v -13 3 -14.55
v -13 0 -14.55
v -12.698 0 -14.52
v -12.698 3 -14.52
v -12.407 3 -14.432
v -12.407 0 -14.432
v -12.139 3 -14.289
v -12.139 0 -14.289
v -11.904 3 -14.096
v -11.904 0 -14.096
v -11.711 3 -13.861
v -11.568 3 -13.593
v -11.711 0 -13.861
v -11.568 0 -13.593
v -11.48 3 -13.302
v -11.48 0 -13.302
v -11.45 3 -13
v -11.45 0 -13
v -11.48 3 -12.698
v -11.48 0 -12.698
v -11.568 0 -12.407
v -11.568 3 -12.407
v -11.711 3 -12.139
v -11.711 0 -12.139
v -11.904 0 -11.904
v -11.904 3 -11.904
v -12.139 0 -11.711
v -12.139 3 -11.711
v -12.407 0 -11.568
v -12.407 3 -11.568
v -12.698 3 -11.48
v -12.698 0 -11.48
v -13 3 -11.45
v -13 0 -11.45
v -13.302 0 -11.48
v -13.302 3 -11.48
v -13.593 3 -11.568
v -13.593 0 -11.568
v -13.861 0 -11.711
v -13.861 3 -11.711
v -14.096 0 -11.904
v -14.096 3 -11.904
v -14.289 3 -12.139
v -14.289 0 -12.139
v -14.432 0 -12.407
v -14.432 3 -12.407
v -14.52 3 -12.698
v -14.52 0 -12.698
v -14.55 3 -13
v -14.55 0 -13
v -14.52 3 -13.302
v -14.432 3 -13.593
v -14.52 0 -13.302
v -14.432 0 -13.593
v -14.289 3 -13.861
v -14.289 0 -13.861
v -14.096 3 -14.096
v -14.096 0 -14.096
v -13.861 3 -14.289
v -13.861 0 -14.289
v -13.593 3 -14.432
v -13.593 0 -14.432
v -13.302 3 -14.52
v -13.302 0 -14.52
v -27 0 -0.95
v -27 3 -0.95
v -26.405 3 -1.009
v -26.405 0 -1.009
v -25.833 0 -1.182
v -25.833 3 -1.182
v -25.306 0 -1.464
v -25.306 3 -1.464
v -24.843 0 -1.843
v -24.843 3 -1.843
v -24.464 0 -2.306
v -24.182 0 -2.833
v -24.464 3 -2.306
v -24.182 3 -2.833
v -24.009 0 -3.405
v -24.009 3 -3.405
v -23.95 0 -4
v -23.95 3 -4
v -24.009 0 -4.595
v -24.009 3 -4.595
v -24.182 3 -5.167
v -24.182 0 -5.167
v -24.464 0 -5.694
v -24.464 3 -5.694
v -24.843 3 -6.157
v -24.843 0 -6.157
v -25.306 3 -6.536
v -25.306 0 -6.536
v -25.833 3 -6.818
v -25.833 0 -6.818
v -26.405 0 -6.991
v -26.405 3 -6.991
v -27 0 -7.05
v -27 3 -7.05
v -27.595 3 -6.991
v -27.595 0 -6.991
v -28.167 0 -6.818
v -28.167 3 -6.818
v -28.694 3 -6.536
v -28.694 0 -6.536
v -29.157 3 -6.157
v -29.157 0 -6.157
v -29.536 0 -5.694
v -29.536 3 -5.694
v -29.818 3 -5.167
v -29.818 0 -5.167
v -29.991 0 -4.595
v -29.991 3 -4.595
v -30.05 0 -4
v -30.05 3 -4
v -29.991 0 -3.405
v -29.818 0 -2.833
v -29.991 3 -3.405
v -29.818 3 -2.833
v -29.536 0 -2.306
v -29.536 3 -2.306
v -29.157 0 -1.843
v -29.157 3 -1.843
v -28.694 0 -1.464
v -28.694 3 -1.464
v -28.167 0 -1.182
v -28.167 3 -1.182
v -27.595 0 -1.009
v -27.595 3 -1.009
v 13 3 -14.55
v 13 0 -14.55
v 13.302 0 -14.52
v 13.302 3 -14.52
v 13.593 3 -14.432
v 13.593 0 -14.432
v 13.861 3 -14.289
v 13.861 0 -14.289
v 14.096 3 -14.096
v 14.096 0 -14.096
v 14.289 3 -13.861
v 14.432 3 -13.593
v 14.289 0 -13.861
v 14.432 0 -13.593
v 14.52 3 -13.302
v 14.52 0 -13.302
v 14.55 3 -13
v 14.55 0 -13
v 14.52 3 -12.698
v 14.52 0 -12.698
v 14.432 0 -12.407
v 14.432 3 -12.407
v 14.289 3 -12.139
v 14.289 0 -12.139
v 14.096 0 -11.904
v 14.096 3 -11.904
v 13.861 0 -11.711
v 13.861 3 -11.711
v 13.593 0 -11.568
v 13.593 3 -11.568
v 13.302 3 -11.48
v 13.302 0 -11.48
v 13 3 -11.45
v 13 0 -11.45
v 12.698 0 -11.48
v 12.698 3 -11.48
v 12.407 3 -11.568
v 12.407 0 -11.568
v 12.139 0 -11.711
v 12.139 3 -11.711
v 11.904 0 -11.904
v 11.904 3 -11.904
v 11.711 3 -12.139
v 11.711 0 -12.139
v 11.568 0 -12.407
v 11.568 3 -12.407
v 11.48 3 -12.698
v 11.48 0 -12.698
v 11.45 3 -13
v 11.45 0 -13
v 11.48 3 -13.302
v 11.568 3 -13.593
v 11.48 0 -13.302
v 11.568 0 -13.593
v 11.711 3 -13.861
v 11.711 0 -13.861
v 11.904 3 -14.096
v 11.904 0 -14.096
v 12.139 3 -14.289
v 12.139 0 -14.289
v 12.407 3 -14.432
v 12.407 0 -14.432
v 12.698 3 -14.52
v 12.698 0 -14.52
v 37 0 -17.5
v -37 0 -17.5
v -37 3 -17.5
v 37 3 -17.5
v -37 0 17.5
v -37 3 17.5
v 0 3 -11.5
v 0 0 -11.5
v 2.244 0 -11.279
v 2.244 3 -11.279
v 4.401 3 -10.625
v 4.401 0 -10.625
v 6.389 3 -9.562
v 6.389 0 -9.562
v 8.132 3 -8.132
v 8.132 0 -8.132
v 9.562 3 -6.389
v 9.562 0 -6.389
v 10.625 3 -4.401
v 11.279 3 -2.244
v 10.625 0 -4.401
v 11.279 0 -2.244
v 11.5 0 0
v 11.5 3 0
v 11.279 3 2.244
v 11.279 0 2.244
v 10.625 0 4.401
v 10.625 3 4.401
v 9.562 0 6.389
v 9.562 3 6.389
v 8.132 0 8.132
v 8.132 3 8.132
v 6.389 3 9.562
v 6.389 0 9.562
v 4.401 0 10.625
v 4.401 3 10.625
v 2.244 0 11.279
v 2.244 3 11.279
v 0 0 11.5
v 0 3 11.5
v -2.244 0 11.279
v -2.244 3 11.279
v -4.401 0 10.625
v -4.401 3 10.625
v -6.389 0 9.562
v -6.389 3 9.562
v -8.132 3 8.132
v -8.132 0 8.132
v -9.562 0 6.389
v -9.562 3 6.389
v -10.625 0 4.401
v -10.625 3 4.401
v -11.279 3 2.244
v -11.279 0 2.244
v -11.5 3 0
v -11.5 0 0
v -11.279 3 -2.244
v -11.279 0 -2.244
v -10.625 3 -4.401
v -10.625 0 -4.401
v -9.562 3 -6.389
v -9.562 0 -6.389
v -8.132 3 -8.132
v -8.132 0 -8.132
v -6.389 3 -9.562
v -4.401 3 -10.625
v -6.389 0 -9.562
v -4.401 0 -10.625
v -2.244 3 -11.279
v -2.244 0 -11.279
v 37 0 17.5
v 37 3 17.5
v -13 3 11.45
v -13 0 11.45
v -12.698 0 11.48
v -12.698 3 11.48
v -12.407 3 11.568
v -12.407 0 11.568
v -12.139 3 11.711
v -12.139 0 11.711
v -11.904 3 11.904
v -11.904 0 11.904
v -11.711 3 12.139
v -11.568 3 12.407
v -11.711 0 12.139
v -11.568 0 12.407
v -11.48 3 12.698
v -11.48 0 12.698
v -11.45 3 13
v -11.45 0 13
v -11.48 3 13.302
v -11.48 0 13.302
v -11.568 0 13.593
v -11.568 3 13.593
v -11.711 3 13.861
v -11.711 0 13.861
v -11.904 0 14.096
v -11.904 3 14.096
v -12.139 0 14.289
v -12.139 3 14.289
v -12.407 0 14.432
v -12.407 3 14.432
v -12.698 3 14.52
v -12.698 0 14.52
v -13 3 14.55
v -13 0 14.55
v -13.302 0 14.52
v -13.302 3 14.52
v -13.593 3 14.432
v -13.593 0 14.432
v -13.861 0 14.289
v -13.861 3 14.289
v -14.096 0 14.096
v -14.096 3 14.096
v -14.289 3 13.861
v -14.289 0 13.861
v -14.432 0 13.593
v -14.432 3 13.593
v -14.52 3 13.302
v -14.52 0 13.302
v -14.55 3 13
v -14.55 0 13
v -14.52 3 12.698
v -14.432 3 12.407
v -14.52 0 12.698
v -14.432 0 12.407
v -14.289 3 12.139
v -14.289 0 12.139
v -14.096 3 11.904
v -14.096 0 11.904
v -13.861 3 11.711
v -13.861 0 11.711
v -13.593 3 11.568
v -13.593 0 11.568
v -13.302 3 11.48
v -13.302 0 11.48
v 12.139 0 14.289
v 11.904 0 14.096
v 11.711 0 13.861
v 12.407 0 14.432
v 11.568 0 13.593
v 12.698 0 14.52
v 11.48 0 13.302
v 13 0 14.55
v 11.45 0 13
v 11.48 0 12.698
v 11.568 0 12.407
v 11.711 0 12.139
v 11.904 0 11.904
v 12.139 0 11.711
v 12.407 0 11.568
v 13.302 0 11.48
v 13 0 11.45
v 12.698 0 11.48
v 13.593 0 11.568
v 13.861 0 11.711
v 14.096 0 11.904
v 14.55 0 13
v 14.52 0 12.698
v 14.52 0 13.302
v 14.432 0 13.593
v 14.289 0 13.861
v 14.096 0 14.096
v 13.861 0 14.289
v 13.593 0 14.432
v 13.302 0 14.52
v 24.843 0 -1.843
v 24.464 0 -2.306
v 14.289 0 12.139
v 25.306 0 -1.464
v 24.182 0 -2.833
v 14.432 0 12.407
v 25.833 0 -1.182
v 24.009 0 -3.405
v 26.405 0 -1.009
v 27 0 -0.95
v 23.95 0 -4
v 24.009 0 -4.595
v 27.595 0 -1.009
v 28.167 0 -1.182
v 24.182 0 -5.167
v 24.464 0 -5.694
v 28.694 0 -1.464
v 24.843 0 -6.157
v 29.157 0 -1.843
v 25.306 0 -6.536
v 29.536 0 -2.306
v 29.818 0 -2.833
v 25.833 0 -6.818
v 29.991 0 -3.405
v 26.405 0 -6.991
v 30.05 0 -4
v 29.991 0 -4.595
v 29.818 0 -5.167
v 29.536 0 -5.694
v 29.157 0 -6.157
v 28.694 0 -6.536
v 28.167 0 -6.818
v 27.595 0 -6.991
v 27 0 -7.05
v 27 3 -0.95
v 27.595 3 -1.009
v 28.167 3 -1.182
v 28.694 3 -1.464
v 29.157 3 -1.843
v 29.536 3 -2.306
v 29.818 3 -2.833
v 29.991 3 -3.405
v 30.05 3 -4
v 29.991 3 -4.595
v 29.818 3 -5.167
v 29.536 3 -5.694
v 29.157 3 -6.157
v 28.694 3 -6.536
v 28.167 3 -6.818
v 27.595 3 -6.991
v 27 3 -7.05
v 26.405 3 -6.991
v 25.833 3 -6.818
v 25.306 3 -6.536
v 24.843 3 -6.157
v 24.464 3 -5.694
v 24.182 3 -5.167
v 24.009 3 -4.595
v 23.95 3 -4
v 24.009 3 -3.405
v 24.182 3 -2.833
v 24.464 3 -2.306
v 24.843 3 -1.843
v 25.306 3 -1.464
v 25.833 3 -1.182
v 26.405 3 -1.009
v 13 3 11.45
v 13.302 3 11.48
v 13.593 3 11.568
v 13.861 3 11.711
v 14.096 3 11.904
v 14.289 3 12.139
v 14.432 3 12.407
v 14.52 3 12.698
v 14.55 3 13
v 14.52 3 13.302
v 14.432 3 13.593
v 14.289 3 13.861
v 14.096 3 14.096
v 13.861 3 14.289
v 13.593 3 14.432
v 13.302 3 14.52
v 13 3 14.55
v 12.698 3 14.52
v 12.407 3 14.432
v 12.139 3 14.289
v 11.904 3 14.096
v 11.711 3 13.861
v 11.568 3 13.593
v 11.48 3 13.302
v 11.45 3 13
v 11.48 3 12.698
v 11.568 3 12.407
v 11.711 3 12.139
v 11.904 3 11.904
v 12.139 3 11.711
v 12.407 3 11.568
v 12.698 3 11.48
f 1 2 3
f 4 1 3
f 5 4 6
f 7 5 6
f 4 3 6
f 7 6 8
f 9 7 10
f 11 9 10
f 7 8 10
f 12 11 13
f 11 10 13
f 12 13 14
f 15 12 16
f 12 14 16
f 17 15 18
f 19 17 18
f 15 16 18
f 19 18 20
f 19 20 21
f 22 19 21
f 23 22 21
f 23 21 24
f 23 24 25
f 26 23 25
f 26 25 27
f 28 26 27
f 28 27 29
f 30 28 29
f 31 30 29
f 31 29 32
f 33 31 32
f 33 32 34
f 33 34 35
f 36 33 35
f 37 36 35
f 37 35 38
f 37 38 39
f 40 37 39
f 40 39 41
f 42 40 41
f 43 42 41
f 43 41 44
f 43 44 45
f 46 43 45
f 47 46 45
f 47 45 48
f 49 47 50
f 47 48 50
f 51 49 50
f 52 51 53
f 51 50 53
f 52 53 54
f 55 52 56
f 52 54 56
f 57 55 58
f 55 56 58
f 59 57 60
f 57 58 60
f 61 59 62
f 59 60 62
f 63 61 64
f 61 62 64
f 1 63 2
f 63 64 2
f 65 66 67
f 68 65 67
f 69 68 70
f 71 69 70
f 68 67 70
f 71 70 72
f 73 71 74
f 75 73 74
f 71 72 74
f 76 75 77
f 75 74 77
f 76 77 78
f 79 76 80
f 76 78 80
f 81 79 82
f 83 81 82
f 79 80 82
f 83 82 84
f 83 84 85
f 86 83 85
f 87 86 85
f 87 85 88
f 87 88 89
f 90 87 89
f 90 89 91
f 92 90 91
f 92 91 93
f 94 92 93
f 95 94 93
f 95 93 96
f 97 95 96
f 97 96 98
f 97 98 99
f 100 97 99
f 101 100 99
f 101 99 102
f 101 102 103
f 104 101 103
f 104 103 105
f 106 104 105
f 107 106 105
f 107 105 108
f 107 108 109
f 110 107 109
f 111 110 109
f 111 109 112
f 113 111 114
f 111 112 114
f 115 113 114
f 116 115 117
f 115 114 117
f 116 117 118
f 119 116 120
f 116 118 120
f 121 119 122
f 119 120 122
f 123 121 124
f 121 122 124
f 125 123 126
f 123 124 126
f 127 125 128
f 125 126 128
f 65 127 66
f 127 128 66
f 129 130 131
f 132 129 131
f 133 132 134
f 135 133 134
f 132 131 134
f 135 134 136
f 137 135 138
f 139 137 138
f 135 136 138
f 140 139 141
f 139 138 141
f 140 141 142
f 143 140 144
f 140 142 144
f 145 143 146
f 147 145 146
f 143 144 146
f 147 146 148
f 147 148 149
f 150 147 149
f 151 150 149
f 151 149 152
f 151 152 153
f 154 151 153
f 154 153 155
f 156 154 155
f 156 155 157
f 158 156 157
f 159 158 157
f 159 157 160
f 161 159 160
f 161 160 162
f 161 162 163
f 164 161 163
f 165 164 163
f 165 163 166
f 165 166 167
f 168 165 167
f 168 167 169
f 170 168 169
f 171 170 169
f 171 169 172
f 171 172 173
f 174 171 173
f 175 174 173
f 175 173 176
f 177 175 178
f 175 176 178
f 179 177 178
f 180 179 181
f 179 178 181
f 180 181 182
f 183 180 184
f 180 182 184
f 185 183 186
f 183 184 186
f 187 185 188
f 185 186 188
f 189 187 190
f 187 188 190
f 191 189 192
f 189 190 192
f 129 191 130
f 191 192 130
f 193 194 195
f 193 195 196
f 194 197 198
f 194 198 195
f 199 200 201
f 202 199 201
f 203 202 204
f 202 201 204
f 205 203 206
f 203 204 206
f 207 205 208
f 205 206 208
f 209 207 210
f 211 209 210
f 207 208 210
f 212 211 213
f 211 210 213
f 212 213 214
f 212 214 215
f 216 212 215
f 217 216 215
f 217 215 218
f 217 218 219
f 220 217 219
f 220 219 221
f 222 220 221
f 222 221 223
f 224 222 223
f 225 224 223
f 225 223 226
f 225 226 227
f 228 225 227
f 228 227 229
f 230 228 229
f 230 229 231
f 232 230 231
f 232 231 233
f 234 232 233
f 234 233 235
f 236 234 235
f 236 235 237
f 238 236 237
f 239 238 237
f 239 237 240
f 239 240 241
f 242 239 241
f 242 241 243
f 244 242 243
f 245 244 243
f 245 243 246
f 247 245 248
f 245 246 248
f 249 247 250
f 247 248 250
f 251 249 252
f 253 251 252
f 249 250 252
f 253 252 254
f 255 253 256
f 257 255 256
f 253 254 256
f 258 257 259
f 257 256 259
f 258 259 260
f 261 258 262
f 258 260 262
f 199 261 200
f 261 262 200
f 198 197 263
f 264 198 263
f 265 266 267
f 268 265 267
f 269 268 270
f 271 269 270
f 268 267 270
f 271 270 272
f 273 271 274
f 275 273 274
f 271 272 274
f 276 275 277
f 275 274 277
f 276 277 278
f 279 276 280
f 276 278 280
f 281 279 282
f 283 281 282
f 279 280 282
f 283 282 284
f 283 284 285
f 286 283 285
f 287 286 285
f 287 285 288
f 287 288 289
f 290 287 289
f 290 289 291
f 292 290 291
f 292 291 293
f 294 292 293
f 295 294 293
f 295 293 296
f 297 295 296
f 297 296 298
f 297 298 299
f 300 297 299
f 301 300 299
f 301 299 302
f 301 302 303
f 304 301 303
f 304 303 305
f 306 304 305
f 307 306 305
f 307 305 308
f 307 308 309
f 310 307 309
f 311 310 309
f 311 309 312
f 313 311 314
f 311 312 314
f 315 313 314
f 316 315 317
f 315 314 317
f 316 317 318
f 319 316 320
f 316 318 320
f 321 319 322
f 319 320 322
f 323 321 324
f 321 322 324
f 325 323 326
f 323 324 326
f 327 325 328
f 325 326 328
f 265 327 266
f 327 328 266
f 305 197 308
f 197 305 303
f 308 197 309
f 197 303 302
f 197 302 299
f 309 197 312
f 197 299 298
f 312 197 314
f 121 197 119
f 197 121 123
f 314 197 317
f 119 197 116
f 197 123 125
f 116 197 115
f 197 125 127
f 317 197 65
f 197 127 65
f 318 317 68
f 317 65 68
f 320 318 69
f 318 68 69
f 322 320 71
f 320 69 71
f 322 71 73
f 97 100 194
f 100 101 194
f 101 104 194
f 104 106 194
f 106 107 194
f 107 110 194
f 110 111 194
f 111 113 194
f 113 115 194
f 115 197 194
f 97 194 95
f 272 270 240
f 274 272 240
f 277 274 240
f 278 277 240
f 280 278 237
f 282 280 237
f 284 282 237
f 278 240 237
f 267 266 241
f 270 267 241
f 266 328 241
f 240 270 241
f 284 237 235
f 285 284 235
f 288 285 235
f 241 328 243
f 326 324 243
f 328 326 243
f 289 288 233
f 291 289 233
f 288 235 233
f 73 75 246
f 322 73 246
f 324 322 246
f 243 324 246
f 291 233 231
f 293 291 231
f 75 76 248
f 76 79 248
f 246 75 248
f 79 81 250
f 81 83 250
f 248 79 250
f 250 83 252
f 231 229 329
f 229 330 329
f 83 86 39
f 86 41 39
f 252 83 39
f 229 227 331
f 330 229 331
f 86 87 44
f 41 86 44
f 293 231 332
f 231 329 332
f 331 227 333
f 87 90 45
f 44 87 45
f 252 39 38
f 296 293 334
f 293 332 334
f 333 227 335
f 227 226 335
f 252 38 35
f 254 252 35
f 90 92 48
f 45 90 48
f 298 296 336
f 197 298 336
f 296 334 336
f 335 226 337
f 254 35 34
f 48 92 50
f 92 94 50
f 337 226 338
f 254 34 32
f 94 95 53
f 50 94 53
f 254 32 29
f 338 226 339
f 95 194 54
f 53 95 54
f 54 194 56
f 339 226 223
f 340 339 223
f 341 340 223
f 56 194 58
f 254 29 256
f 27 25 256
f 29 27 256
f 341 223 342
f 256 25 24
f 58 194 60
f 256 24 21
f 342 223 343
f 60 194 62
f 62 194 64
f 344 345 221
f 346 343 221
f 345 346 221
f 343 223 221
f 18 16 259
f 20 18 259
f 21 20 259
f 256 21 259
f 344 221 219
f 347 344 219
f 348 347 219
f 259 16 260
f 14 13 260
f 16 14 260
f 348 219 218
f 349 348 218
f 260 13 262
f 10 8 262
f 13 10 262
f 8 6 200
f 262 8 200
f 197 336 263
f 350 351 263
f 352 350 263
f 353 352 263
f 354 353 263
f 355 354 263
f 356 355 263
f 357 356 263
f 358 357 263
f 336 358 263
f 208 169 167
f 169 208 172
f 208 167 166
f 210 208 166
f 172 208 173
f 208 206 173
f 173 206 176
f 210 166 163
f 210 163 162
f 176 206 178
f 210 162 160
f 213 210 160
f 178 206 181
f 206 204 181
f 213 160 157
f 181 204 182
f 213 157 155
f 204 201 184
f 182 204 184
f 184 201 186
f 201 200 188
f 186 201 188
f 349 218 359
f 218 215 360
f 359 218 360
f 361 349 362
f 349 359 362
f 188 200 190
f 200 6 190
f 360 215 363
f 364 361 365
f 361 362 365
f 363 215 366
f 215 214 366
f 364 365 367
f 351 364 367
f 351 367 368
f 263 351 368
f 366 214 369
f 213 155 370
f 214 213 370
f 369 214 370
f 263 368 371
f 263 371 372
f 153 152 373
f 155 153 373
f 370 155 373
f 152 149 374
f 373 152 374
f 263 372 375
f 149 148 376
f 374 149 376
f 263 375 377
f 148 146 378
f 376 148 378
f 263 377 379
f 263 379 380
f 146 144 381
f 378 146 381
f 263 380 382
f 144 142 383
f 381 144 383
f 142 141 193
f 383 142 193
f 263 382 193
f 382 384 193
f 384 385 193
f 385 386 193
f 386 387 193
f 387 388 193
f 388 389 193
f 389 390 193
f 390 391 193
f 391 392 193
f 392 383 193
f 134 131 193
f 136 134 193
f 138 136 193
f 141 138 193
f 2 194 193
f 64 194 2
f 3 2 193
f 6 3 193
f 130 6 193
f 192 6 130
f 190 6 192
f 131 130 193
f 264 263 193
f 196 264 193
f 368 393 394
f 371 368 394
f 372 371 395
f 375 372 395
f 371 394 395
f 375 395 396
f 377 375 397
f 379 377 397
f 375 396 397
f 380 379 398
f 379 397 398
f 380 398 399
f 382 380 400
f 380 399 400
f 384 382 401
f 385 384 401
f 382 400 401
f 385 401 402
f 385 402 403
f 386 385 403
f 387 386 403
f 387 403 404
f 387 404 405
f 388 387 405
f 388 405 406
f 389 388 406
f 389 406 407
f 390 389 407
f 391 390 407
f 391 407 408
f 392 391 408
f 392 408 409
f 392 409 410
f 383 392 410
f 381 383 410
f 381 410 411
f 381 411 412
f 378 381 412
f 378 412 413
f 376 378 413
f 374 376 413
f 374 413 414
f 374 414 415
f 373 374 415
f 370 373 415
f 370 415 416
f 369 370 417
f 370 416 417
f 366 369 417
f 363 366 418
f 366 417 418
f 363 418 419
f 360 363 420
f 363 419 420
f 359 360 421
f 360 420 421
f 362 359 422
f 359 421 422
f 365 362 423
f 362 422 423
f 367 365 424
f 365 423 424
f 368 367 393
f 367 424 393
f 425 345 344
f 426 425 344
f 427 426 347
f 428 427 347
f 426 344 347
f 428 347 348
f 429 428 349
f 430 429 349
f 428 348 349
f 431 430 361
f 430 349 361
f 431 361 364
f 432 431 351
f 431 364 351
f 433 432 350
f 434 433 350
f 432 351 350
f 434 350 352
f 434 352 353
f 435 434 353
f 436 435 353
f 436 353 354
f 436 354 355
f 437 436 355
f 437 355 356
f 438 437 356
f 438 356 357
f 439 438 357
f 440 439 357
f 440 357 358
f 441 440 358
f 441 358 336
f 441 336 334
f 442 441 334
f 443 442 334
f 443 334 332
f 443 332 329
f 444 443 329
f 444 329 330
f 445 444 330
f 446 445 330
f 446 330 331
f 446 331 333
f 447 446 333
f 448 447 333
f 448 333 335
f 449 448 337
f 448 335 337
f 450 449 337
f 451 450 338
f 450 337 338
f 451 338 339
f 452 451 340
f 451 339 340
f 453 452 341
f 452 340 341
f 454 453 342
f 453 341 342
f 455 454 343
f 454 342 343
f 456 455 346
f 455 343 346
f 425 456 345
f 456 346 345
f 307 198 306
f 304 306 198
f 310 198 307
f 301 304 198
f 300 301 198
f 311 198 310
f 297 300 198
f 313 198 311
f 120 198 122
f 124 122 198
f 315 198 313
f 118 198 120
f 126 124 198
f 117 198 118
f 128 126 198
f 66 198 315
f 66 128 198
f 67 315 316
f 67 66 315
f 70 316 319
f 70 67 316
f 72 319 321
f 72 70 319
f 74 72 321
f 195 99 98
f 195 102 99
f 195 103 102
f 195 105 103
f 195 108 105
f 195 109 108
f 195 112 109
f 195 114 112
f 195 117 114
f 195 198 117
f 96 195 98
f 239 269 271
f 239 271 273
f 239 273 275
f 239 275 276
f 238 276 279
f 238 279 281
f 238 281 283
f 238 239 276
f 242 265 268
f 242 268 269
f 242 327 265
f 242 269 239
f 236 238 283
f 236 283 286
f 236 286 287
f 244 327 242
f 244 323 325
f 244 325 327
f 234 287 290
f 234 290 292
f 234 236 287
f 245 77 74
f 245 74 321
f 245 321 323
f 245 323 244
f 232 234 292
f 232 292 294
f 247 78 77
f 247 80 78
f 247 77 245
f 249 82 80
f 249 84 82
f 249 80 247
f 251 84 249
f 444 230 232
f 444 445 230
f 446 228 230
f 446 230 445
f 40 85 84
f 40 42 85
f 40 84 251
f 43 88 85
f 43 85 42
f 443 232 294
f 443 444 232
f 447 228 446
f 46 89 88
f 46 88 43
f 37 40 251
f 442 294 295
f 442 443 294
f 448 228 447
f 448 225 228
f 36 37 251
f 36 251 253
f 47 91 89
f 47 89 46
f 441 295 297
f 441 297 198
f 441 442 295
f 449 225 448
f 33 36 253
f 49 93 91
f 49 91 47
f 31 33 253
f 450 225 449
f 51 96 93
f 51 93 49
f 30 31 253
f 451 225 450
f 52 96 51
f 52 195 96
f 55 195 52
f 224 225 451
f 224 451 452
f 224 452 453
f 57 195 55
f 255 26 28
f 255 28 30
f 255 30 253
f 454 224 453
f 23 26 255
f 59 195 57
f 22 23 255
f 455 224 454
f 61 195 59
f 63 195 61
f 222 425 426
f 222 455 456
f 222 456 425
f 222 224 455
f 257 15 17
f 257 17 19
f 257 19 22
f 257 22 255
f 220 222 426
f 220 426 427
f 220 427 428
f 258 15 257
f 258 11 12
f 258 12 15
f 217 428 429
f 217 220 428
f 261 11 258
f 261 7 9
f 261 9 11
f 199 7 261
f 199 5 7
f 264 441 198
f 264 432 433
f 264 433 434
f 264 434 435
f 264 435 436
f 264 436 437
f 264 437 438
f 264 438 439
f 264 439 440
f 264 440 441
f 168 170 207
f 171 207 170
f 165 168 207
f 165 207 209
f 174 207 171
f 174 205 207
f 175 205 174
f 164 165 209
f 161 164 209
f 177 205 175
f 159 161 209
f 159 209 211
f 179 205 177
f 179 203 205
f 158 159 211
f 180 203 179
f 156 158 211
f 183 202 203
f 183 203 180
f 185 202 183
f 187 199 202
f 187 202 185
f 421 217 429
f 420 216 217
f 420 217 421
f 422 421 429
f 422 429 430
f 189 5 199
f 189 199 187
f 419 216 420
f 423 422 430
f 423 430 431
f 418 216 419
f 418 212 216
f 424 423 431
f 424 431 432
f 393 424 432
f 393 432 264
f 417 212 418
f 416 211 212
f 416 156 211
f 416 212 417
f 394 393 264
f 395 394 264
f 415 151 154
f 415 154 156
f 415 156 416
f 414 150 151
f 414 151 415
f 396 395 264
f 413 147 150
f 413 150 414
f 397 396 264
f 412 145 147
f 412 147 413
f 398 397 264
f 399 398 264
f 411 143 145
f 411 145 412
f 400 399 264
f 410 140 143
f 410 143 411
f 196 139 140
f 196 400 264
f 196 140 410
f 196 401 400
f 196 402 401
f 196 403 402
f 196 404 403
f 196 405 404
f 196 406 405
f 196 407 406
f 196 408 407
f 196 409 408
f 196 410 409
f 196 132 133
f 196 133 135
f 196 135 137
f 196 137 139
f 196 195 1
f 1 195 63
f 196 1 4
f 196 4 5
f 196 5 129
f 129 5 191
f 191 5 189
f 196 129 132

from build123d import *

# Parameters (mm, degrees)
SKETCH_1_W          = 74
SKETCH_1_H          = 35
EXTRUDE_1_DEPTH     = 3
SKETCH_3_R          = 1.55
CUT_EXTRUDE_1_DEPTH = 10
SKETCH_4_R          = 3.05
CUT_EXTRUDE_2_DEPTH = 10
SKETCH_5_R          = 11.5
CUT_EXTRUDE_3_DEPTH = 10


with BuildPart() as part:
    # 草图1 → 凸台-拉伸1 (new body)
    with BuildSketch(Plane(origin=(0, 0, 0), x_dir=(1, 0, 0), z_dir=(0, 1, 0))):
        Rectangle(SKETCH_1_W, SKETCH_1_H)
    extrude(amount=EXTRUDE_1_DEPTH)

    # 草图3 → 切除-拉伸1 (cut)
    with BuildSketch(Plane(origin=(0, 0, 0), x_dir=(-1, 0, 0), z_dir=(0, -1, 0))):
        with Locations(Location((13, -13, 0), (0, 0, 90))):
            Circle(SKETCH_3_R)
        with Locations(Location((-13, -13, 0), (0, 0, 90))):
            Circle(SKETCH_3_R)
        with Locations(Location((-13, 13, 0), (0, 0, 90))):
            Circle(SKETCH_3_R)
        with Locations(Location((13, 13, 0), (0, 0, 90))):
            Circle(SKETCH_3_R)
    extrude(amount=-CUT_EXTRUDE_1_DEPTH, mode=Mode.SUBTRACT)

    # 草图4 → 切除-拉伸2 (cut)
    with BuildSketch(Plane(origin=(0, 3, 0), x_dir=(1, 0, 0), z_dir=(0, 1, 0))):
        with Locations(Location((-27, 4, 0), (0, 0, 270))):
            Circle(SKETCH_4_R)
        with Locations(Location((27, 4, 0), (0, 0, 270))):
            Circle(SKETCH_4_R)
    extrude(amount=-CUT_EXTRUDE_2_DEPTH, mode=Mode.SUBTRACT)

    # 草图5 → 切除-拉伸3 (cut)
    with BuildSketch(Plane(origin=(0, 0, 0), x_dir=(-1, 0, 0), z_dir=(0, -1, 0))):
        with Locations(Location((0, 0, 0), (0, 0, 90))):
            Circle(SKETCH_5_R)
    extrude(amount=-CUT_EXTRUDE_3_DEPTH, mode=Mode.SUBTRACT)


solid = part.part
